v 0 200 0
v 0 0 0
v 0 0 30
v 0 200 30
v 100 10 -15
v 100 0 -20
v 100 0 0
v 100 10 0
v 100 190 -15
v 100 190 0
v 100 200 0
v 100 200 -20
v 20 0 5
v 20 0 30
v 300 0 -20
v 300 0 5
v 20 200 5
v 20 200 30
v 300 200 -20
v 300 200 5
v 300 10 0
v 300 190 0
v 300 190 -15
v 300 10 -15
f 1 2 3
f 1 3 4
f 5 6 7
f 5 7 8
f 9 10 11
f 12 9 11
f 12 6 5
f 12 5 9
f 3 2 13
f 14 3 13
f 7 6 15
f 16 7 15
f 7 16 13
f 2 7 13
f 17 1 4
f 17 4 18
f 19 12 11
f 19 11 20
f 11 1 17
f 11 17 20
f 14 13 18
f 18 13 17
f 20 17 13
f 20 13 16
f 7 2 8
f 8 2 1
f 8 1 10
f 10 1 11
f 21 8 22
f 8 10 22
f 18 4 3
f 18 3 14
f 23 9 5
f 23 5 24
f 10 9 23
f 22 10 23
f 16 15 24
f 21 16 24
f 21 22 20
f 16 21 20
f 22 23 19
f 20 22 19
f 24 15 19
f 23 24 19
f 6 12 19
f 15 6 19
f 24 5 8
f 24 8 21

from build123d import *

# Parameters (mm, degrees)
BOX001_W     = 20
BOX001_H     = 200
BOX001_DEPTH = 30
BOX002_W     = 200
BOX002_H     = 10
BOX002_DEPTH = 20
BOX003_W     = 200
BOX003_H     = 10
BOX003_DEPTH = 20
BOX004_W     = 300
BOX004_H     = 200
BOX004_DEPTH = 5
BOX_W        = 200
BOX_H        = 200
BOX_DEPTH    = 5


with BuildPart() as cube001:
    # Box001 → Box001 (new body)
    with BuildSketch(Plane.XY):
        with Locations((10, 100)):
            Rectangle(BOX001_W, BOX001_H)
    extrude(amount=BOX001_DEPTH)


with BuildPart() as cube002:
    # Box002 → Box002 (new body)
    with BuildSketch(Plane(origin=(100, 190, -20), x_dir=(1, 0, 0), z_dir=(0, 0, 1))):
        with Locations((100, 5)):
            Rectangle(BOX002_W, BOX002_H)
    extrude(amount=BOX002_DEPTH)


with BuildPart() as cube003:
    # Box003 → Box003 (new body)
    with BuildSketch(Plane(origin=(100, 0, -20), x_dir=(1, 0, 0), z_dir=(0, 0, 1))):
        with Locations((100, 5)):
            Rectangle(BOX003_W, BOX003_H)
    extrude(amount=BOX003_DEPTH)


with BuildPart() as cube004:
    # Box004 → Box004 (new body)
    with BuildSketch(Plane.XY):
        with Locations((150, 100)):
            Rectangle(BOX004_W, BOX004_H)
    extrude(amount=BOX004_DEPTH)


with BuildPart() as fusion:
    # Box → Box (new body)
    with BuildSketch(Plane(origin=(100, 0, -20), x_dir=(1, 0, 0), z_dir=(0, 0, 1))):
        with Locations((100, 100)):
            Rectangle(BOX_W, BOX_H)
    extrude(amount=BOX_DEPTH)

    # Fusion: union Cube001, Cube002, Cube003, Cube004
    add(cube001.part)
    add(cube002.part)
    add(cube003.part)
    add(cube004.part)


solid = fusion.part
